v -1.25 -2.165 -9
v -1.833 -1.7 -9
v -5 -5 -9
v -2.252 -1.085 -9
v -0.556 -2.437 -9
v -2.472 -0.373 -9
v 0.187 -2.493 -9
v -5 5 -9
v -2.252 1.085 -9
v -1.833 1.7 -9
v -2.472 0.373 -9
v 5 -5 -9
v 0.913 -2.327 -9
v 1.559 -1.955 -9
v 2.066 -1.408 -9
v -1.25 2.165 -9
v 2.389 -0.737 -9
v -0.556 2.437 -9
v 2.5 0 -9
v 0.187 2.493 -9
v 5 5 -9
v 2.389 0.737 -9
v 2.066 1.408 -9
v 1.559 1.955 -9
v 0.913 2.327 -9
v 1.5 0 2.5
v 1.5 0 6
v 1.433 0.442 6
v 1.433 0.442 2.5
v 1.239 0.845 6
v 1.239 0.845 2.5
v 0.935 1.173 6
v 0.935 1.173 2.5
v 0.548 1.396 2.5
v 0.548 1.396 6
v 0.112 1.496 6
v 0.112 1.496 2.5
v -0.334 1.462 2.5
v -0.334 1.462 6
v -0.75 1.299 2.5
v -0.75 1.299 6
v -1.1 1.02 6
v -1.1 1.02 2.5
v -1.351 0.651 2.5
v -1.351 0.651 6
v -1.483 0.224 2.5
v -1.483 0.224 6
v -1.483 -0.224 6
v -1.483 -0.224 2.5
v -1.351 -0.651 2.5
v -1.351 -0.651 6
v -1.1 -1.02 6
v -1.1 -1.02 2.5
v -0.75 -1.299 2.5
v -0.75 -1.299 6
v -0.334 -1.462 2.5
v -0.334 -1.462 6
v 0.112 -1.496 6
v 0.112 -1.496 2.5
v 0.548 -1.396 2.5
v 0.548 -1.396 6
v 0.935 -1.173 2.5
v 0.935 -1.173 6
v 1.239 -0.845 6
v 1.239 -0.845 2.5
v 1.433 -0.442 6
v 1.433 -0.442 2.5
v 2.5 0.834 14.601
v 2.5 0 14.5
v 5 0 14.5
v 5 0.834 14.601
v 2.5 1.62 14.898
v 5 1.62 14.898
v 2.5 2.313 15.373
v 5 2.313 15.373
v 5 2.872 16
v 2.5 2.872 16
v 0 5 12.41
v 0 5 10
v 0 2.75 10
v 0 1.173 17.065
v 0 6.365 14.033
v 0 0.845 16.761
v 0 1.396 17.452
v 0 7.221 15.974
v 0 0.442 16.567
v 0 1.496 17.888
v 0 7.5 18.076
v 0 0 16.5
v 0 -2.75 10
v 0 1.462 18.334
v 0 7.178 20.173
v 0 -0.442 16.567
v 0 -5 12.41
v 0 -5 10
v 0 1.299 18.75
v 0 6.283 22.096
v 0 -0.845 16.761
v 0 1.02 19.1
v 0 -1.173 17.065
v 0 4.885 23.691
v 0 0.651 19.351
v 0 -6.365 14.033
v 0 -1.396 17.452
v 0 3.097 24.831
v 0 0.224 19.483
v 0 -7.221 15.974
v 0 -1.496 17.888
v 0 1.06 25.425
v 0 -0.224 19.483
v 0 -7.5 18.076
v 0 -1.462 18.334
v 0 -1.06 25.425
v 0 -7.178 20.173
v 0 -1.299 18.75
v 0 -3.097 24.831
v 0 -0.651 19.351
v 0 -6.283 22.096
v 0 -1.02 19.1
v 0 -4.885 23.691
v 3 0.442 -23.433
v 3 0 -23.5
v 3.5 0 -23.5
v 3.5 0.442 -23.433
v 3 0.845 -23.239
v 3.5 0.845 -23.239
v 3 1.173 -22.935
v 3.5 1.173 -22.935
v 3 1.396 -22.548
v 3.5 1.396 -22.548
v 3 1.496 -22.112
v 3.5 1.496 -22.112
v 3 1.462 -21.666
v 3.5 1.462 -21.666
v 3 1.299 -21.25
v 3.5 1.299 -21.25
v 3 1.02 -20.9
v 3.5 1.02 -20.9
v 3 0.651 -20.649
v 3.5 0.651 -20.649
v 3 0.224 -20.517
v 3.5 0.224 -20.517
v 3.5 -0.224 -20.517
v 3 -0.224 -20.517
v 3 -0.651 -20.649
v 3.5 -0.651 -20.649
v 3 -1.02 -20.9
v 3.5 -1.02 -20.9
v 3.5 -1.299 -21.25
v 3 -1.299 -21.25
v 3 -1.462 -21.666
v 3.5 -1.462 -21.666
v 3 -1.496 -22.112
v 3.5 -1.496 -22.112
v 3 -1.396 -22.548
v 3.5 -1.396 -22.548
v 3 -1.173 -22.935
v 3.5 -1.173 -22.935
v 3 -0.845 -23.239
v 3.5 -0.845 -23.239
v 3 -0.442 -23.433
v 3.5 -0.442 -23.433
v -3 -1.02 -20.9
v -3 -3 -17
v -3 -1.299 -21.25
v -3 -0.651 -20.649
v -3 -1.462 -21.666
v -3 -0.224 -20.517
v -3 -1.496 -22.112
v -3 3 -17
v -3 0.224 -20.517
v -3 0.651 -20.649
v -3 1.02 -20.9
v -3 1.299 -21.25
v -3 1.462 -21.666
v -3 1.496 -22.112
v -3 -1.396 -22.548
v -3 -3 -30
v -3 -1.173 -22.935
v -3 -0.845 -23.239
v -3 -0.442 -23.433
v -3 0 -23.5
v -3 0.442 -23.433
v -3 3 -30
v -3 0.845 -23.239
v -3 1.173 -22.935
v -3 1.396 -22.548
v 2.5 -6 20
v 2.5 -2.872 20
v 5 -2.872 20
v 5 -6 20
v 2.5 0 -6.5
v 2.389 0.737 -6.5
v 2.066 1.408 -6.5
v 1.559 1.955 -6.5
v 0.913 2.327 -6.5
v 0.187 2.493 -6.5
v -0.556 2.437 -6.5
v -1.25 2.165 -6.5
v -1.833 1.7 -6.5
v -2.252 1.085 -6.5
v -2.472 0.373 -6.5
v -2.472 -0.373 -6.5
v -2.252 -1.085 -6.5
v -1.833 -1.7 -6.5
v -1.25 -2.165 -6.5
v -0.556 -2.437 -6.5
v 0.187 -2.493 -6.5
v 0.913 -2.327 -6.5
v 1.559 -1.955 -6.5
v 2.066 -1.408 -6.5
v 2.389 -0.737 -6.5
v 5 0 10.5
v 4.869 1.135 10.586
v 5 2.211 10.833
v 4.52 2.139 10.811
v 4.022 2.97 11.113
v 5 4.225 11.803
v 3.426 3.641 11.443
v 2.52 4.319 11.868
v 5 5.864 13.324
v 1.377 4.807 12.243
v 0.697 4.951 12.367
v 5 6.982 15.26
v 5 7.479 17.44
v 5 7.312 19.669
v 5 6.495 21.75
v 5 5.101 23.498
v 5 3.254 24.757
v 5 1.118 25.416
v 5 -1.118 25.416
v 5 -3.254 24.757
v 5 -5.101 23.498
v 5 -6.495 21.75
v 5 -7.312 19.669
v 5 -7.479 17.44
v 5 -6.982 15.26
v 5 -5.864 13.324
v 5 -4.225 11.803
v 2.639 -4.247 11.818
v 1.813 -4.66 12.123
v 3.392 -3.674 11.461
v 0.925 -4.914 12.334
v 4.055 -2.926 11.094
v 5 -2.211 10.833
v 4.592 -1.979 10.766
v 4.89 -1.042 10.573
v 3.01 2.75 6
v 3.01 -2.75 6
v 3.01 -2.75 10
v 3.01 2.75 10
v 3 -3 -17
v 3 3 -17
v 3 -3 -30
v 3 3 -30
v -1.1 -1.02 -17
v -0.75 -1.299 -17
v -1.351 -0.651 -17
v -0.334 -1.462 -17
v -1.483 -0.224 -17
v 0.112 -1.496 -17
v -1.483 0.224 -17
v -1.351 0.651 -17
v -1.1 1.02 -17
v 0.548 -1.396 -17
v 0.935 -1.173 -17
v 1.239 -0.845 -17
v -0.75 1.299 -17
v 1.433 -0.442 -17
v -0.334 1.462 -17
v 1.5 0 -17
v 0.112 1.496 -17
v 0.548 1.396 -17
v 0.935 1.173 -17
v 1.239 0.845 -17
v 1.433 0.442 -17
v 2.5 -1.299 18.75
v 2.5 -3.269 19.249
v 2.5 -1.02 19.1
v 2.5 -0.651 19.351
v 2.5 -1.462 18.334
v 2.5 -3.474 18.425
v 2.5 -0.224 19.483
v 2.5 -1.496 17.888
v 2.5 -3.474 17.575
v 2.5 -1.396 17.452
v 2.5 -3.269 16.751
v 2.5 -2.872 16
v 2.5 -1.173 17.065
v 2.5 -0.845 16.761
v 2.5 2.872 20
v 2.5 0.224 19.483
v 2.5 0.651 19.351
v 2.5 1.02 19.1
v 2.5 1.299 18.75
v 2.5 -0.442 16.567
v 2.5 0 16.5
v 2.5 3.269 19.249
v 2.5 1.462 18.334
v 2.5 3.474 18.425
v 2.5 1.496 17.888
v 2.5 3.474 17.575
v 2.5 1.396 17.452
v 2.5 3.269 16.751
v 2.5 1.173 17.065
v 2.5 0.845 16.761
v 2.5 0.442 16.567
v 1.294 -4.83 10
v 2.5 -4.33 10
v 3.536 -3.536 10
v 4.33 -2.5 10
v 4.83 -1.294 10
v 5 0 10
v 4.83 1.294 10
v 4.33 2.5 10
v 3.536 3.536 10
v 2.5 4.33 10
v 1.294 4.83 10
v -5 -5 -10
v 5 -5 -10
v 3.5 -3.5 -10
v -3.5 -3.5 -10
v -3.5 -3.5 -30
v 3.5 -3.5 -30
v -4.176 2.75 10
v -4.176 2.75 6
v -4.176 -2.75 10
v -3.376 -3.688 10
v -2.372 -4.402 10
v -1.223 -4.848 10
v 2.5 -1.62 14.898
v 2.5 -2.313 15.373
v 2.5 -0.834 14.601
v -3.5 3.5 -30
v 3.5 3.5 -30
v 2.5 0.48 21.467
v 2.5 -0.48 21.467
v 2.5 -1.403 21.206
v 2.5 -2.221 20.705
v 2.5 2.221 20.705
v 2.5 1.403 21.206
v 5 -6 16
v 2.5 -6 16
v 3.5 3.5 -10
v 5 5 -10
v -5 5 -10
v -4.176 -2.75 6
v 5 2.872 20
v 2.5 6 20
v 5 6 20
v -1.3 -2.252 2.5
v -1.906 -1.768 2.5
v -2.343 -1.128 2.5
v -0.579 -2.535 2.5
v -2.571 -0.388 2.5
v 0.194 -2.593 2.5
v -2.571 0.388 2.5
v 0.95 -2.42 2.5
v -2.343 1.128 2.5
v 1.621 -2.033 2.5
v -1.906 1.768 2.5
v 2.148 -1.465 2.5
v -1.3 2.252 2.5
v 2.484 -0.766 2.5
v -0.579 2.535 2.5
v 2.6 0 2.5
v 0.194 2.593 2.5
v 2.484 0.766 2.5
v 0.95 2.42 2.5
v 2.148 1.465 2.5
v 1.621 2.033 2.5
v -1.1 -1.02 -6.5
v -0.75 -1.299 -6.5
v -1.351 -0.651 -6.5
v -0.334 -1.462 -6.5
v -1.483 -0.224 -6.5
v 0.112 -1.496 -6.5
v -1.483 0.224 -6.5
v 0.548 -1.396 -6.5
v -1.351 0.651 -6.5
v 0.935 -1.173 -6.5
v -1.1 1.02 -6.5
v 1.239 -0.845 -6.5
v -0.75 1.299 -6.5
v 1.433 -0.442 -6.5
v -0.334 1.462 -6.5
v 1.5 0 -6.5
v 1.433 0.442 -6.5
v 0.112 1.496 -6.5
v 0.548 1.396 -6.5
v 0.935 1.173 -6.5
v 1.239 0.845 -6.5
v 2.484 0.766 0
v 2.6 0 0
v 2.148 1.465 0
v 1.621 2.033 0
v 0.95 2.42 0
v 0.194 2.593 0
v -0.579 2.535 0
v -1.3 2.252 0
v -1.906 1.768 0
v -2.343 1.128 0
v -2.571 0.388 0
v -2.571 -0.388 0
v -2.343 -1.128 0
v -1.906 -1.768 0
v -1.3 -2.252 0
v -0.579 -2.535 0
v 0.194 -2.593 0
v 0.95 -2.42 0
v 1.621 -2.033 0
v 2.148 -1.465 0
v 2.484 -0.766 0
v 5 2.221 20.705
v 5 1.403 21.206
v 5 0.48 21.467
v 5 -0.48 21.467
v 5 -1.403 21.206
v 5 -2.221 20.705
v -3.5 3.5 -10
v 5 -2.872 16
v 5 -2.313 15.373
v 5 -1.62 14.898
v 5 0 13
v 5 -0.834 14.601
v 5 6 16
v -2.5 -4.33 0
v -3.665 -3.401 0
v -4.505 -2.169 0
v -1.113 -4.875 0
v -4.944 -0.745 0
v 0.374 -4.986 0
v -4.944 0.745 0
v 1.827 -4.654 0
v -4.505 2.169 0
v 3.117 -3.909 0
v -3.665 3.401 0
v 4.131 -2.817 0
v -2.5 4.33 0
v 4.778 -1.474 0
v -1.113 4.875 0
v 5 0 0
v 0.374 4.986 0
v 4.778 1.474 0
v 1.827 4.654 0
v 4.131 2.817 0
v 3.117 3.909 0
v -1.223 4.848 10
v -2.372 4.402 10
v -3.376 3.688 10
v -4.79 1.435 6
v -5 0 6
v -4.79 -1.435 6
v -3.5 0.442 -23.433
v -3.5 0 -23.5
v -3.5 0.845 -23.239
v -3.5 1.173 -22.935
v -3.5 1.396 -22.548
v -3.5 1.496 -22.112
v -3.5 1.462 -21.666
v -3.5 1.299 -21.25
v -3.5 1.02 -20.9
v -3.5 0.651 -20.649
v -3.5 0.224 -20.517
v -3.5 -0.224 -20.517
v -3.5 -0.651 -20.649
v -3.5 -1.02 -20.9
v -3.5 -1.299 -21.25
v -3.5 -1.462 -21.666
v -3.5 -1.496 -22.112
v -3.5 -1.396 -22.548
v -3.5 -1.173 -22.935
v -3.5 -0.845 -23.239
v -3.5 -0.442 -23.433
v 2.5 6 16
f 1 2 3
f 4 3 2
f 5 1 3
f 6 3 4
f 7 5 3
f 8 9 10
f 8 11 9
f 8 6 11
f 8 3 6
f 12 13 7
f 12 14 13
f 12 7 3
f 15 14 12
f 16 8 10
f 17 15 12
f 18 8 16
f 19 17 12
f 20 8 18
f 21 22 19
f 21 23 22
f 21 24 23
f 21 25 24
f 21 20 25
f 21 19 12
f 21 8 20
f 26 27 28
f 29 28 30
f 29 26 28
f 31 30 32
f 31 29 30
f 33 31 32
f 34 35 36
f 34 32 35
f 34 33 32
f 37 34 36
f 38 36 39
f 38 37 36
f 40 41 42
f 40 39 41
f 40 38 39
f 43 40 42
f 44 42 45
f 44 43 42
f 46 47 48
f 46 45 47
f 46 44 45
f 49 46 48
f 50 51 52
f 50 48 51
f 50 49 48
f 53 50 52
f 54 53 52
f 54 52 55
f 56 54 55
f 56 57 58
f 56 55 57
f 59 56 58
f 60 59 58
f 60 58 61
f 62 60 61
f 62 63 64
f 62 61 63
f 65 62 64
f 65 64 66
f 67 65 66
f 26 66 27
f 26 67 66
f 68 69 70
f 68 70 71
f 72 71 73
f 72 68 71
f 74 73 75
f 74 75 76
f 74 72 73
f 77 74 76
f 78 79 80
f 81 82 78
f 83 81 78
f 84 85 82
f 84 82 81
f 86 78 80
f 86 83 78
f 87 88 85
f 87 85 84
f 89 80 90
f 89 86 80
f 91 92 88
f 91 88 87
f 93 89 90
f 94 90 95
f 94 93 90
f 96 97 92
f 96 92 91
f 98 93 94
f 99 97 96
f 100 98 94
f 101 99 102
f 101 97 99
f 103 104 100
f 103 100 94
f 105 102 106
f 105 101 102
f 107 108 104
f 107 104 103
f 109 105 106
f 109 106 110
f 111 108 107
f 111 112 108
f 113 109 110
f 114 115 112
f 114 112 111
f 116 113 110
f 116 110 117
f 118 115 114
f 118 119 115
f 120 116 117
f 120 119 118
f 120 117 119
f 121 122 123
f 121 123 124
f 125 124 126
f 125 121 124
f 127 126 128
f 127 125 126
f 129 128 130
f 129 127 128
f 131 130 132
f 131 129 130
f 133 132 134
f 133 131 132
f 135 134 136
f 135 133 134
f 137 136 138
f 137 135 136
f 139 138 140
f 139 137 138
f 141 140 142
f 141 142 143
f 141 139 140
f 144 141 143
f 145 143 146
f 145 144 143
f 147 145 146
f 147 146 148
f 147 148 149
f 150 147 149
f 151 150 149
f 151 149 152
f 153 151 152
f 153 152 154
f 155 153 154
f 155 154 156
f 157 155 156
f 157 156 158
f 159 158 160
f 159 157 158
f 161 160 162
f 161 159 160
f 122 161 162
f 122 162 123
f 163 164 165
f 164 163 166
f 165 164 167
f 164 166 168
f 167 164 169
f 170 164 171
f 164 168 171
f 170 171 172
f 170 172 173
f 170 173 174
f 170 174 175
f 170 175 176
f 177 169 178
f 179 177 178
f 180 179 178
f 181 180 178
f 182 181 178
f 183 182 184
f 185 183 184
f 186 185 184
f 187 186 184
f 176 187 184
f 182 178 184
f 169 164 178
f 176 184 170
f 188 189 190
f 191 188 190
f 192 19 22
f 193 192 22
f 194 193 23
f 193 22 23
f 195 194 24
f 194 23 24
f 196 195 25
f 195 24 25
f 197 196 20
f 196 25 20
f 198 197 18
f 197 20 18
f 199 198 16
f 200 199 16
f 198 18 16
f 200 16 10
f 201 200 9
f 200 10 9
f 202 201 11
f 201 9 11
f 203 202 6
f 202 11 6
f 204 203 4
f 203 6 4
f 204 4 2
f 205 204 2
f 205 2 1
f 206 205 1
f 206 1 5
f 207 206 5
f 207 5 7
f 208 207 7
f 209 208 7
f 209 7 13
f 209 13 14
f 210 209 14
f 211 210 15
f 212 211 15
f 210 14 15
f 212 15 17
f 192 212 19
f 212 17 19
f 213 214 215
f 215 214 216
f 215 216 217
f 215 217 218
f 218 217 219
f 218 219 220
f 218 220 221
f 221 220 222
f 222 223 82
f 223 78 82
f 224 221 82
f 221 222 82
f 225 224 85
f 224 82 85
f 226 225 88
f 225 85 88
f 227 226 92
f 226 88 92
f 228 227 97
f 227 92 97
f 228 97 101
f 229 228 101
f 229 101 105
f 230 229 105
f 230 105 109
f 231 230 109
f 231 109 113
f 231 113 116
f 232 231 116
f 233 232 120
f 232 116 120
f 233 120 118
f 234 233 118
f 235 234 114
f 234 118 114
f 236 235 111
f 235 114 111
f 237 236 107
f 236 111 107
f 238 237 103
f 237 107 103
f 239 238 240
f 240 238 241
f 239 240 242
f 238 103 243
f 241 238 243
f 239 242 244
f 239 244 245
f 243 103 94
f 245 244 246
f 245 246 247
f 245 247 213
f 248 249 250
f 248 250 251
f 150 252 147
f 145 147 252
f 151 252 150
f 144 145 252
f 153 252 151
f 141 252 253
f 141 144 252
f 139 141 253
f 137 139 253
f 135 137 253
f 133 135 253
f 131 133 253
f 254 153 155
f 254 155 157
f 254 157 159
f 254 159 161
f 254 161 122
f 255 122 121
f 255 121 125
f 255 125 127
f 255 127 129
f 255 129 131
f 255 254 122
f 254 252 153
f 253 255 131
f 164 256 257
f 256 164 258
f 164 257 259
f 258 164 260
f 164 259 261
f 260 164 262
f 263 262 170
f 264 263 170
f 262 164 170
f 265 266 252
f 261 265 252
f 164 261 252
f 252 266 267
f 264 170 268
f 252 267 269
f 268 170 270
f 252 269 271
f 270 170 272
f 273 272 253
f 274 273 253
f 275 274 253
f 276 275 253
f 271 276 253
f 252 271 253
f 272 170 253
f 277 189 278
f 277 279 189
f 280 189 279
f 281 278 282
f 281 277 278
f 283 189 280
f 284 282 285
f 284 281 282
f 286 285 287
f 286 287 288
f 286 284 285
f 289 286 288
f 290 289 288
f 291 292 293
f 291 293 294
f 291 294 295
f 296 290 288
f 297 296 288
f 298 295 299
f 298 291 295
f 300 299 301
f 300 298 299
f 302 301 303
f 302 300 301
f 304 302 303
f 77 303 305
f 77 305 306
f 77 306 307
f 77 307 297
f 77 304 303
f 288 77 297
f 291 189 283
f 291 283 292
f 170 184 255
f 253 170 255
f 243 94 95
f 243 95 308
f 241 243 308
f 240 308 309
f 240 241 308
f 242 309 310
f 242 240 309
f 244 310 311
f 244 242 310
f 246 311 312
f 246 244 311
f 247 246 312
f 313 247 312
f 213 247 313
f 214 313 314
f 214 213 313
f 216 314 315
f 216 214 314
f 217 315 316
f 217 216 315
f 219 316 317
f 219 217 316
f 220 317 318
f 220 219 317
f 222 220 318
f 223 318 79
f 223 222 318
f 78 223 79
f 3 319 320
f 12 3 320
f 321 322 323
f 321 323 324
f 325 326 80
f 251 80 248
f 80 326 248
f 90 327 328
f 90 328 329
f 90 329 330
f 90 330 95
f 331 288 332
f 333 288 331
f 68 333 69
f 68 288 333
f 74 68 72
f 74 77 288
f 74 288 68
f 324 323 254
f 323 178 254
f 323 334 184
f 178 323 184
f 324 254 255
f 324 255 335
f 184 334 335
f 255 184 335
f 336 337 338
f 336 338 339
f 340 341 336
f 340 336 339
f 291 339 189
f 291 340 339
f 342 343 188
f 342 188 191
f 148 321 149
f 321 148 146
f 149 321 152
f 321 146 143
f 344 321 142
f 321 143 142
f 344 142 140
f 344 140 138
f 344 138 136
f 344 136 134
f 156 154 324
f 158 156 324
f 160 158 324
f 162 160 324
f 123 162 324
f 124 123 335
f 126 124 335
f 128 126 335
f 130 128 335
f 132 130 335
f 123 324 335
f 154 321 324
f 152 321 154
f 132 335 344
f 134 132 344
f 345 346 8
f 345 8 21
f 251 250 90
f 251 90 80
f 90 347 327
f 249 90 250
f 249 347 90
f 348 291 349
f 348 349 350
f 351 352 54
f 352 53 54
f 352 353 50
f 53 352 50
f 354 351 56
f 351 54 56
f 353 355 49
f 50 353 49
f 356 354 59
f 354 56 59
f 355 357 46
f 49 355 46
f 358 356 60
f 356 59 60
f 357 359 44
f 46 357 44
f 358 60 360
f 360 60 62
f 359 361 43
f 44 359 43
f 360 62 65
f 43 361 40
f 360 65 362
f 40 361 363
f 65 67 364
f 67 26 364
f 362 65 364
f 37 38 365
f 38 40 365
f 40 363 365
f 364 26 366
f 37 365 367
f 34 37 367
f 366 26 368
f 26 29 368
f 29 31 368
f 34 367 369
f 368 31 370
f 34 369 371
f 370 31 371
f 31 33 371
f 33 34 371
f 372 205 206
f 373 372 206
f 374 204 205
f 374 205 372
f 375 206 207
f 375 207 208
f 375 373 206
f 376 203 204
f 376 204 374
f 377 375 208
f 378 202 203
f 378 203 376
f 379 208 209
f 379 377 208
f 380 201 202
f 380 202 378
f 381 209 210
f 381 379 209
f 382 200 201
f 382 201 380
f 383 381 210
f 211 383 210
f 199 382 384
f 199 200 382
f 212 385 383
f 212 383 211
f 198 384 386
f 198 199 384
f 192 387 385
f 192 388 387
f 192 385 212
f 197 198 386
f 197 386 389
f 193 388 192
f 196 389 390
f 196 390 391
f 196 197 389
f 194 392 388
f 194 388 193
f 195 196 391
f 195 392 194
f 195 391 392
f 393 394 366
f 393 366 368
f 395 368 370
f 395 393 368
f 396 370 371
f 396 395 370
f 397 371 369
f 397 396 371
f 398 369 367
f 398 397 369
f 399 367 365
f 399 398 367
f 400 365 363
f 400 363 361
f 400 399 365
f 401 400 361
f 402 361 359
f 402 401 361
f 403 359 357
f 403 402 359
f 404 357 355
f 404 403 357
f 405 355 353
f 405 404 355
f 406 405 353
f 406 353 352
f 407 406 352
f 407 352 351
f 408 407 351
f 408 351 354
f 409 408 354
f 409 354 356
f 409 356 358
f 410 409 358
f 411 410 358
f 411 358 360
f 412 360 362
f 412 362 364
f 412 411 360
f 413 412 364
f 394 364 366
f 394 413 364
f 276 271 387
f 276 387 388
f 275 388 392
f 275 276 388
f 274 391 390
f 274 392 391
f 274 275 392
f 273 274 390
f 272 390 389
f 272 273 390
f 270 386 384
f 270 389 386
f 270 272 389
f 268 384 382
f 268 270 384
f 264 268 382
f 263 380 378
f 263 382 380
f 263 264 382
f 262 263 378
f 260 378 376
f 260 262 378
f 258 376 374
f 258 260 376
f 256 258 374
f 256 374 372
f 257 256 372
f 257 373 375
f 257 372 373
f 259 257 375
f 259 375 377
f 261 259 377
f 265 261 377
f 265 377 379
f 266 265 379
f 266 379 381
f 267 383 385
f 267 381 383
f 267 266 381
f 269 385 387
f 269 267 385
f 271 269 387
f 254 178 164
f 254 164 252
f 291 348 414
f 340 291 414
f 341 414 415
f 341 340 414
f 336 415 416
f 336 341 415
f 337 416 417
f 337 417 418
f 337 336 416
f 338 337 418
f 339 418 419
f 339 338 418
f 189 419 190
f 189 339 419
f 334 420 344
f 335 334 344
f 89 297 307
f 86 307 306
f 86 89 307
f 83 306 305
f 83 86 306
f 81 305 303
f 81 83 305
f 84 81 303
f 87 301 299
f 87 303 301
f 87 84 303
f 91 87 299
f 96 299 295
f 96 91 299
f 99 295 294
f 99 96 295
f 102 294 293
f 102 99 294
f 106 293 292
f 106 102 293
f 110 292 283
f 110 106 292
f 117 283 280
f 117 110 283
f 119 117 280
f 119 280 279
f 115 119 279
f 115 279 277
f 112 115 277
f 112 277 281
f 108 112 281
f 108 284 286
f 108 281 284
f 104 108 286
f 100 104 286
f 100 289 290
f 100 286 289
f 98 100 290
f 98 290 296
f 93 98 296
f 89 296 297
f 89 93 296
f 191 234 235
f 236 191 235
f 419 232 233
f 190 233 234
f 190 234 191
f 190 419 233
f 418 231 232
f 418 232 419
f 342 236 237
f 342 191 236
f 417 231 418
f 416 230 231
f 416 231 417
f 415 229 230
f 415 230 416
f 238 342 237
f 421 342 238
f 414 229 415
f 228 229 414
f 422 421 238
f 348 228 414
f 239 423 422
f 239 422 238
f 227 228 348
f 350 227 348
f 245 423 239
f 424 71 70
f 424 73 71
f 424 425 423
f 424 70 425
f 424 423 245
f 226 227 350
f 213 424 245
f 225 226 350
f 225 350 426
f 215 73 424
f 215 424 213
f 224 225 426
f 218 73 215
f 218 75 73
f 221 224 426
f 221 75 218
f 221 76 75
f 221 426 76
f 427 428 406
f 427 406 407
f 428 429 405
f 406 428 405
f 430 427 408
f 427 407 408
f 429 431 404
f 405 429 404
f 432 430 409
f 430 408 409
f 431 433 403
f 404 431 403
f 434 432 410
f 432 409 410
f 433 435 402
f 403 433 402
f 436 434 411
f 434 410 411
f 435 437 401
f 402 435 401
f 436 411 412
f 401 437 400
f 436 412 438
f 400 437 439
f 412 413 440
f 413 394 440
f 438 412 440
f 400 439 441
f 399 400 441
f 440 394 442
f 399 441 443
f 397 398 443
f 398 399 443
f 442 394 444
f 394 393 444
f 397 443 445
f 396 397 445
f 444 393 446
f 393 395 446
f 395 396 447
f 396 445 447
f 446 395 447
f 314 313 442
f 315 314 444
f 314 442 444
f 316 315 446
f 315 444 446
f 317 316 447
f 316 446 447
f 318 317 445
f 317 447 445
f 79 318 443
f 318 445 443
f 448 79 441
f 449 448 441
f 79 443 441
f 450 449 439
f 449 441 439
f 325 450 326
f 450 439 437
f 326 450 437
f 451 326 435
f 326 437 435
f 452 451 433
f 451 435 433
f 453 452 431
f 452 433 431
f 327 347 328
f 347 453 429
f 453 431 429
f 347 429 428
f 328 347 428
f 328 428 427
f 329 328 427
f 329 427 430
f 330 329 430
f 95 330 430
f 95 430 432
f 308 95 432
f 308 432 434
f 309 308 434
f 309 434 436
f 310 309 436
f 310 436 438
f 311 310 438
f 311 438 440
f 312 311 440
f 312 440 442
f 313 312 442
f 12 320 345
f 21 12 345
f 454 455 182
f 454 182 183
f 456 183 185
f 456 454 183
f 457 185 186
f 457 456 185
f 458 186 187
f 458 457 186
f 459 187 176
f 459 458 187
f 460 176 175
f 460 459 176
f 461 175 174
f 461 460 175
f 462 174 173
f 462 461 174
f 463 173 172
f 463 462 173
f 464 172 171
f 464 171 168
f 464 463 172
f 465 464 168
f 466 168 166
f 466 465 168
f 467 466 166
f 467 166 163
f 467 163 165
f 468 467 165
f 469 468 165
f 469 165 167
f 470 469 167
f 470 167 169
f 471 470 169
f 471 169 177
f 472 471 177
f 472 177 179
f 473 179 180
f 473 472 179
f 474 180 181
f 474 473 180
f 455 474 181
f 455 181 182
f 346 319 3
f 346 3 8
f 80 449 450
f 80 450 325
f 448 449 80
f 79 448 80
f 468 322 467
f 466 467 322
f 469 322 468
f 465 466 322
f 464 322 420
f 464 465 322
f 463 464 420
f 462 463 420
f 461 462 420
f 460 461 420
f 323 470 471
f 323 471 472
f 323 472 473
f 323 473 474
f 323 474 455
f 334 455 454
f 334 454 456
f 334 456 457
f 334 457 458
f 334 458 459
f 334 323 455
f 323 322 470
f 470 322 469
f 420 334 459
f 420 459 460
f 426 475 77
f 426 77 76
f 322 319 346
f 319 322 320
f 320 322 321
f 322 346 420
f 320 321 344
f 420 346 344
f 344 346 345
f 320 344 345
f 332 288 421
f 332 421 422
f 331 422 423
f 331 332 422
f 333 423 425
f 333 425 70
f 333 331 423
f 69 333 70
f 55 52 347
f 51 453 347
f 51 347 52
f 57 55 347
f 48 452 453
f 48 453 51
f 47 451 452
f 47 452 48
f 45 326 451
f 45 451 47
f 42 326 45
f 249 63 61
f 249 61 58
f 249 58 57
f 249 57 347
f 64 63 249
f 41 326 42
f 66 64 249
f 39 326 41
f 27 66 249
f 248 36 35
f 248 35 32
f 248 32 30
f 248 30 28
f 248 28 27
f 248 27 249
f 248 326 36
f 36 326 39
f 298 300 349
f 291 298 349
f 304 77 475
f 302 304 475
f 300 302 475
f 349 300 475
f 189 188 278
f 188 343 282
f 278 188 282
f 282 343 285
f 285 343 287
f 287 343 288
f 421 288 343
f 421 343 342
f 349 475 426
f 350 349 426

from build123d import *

# Parameters (mm, degrees)
CYLINDER003_R               = 1.5
CYLINDER003_DEPTH           = 0.5
CYLINDER003_PITCH_ANGLE     = 90
CYLINDER002_R               = 1.5
CYLINDER002_DEPTH           = 0.5
CYLINDER002_PITCH_ANGLE     = 90
CYLINDER001_R               = 1.5
CYLINDER001_DEPTH           = 12
BOX003_W                    = 6
BOX003_H                    = 6
BOX003_DEPTH                = 13
CYLINDER_R                  = 2.5
CYLINDER_DEPTH              = 2.5
BOX001_W                    = 7
BOX001_H                    = 7
BOX001_DEPTH                = 20
BOX_W                       = 10
BOX_H                       = 10
BOX_DEPTH                   = 1
BOX007_W                    = 2.5
BOX007_H                    = 12
BOX007_DEPTH                = 4
BOX006_W                    = 1.99
BOX006_H                    = 10
BOX006_DEPTH                = 4
BOX004_W                    = 10
BOX004_H                    = 2.25
BOX004_DEPTH                = 4
BOX005_W                    = 10
BOX005_H                    = 2.25
BOX005_DEPTH                = 4
CYLINDER013_R               = 5
CYLINDER013_DEPTH           = 4
CYLINDER007_R               = 1.5
CYLINDER007_DEPTH           = 5
CYLINDER005_R               = 2.6
CYLINDER005_DEPTH           = 2.5
CYLINDER004_R               = 5
CYLINDER004_DEPTH           = 10
CYLINDER009_W               = 5
CYLINDER009_H               = 3
CYLINDER009_ANGLE           = 180
CYLINDER009_PLACEMENT_ANGLE = -90
CYLINDER012_R               = 3.5
CYLINDER012_DEPTH           = 2.5
CYLINDER012_PITCH_ANGLE     = 90
CYLINDER011_R               = 1.5
CYLINDER011_DEPTH           = 5
CYLINDER011_PITCH_ANGLE     = 90
CYLINDER008_R               = 7.5
CYLINDER008_DEPTH           = 5
CYLINDER008_PITCH_ANGLE     = 90


with BuildPart() as zylinder003:
    # Cylinder003 → Cylinder003 (new body)
    with BuildSketch(Plane.XY):
        Circle(CYLINDER003_R)
    extrude(amount=CYLINDER003_DEPTH)


with BuildPart() as zylinder003_1:
    # Cylinder003 pitch: moved
    add(zylinder003.part.rotate(Axis((0, 0, 0), (0, 1, 0)), CYLINDER003_PITCH_ANGLE))


with BuildPart() as zylinder003_2:
    # Cylinder003 placement: moved
    add(zylinder003_1.part.moved(Location((-3.5, 0, -22))))


with BuildPart() as zylinder002:
    # Cylinder002 → Cylinder002 (new body)
    with BuildSketch(Plane.XY):
        Circle(CYLINDER002_R)
    extrude(amount=CYLINDER002_DEPTH)


with BuildPart() as zylinder002_1:
    # Cylinder002 pitch: moved
    add(zylinder002.part.rotate(Axis((0, 0, 0), (0, 1, 0)), CYLINDER002_PITCH_ANGLE))


with BuildPart() as zylinder002_2:
    # Cylinder002 placement: moved
    add(zylinder002_1.part.moved(Location((3, 0, -22))))


with BuildPart() as zylinder001:
    # Cylinder001 → Cylinder001 (new body)
    with BuildSketch(Plane.XY.offset(-18)):
        Circle(CYLINDER001_R)
    extrude(amount=CYLINDER001_DEPTH)


with BuildPart() as w_rfel003:
    # Box003 → Box003 (new body)
    with BuildSketch(Plane(origin=(-3, -3, -30), x_dir=(1, 0, 0), z_dir=(0, 0, 1))):
        with Locations((3, 3)):
            Rectangle(BOX003_W, BOX003_H)
    extrude(amount=BOX003_DEPTH)


with BuildPart() as zylinder:
    # Cylinder → Cylinder (new body)
    with BuildSketch(Plane.XY.offset(-9)):
        Circle(CYLINDER_R)
    extrude(amount=CYLINDER_DEPTH)


with BuildPart() as w_rfel001:
    # Box001 → Box001 (new body)
    with BuildSketch(Plane(origin=(-3.5, -3.5, -30), x_dir=(1, 0, 0), z_dir=(0, 0, 1))):
        with Locations((3.5, 3.5)):
            Rectangle(BOX001_W, BOX001_H)
    extrude(amount=BOX001_DEPTH)


with BuildPart() as bottom:
    # Box → Box (new body)
    with BuildSketch(Plane(origin=(-5, -5, -10), x_dir=(1, 0, 0), z_dir=(0, 0, 1))):
        with Locations((5, 5)):
            Rectangle(BOX_W, BOX_H)
    extrude(amount=BOX_DEPTH)

    # Fusion001: union Zylinder, Würfel001
    add(zylinder.part)
    add(w_rfel001.part)

    # Cut: cut Würfel003
    add(w_rfel003.part, mode=Mode.SUBTRACT)

    # Cut001: cut Zylinder001
    add(zylinder001.part, mode=Mode.SUBTRACT)

    # Cut002: cut Zylinder002
    add(zylinder002_2.part, mode=Mode.SUBTRACT)

    # Cut003: cut Zylinder003
    add(zylinder003_2.part, mode=Mode.SUBTRACT)


with BuildPart() as w_rfel007:
    # Box007 → Box007 (new body)
    with BuildSketch(Plane(origin=(2.5, -6, 16), x_dir=(1, 0, 0), z_dir=(0, 0, 1))):
        with Locations((1.25, 6)):
            Rectangle(BOX007_W, BOX007_H)
    extrude(amount=BOX007_DEPTH)


with BuildPart() as w_rfel006:
    # Box006 → Box006 (new body)
    with BuildSketch(Plane(origin=(3.01, 12, 0), x_dir=(1, 0, 0), z_dir=(0, 0, 1))):
        with Locations((0.995, 5)):
            Rectangle(BOX006_W, BOX006_H)
    extrude(amount=BOX006_DEPTH)


with BuildPart() as w_rfel004:
    # Box004 → Box004 (new body)
    with BuildSketch(Plane(origin=(-5, 19.75, 0), x_dir=(1, 0, 0), z_dir=(0, 0, 1))):
        with Locations((5, 1.125)):
            Rectangle(BOX004_W, BOX004_H)
    extrude(amount=BOX004_DEPTH)


with BuildPart() as fusion002:
    # Box005 → Box005 (new body)
    with BuildSketch(Plane(origin=(-5, 12, 0), x_dir=(1, 0, 0), z_dir=(0, 0, 1))):
        with Locations((5, 1.125)):
            Rectangle(BOX005_W, BOX005_H)
    extrude(amount=BOX005_DEPTH)

    # Fusion: union Würfel004
    add(w_rfel004.part)

    # Fusion002: union Würfel006
    add(w_rfel006.part)


with BuildPart() as cut011:
    # Cylinder013 → Cylinder013 (new body)
    with BuildSketch(Plane(origin=(0, 17, 0), x_dir=(1, 0, 0), z_dir=(0, 0, 1))):
        Circle(CYLINDER013_R)
    extrude(amount=CYLINDER013_DEPTH)

    # Cut011: cut Fusion002
    add(fusion002.part, mode=Mode.SUBTRACT)


with BuildPart() as cut011_1:
    # Cut011 placement: moved
    add(cut011.part.moved(Location((0, -17, 6))))


with BuildPart() as zylinder007:
    # Cylinder007 → Cylinder007 (new body)
    with BuildSketch(Plane.XY.offset(2.5)):
        Circle(CYLINDER007_R)
    extrude(amount=CYLINDER007_DEPTH)


with BuildPart() as zylinder005:
    # Cylinder005 → Cylinder005 (new body)
    with BuildSketch(Plane.XY):
        Circle(CYLINDER005_R)
    extrude(amount=CYLINDER005_DEPTH)


with BuildPart() as cut012:
    # Cylinder004 → Cylinder004 (new body)
    with BuildSketch(Plane.XY):
        Circle(CYLINDER004_R)
    extrude(amount=CYLINDER004_DEPTH)

    # Cut004: cut Zylinder005
    add(zylinder005.part, mode=Mode.SUBTRACT)

    # Cut009: cut Zylinder007
    add(zylinder007.part, mode=Mode.SUBTRACT)

    # Cut012: cut Cut011
    add(cut011_1.part, mode=Mode.SUBTRACT)


with BuildPart() as zylinder009:
    # Cylinder009 → Cylinder009 (revolve)
    with BuildSketch(Plane.XZ):
        with Locations((2.5, 1.5)):
            Rectangle(CYLINDER009_W, CYLINDER009_H)
    revolve(axis=Axis((0, 0, 0), (0, 0, 1)), revolution_arc=CYLINDER009_ANGLE)


with BuildPart() as zylinder009_1:
    # Cylinder009 placement: moved
    add(zylinder009.part.moved(Location((0, 0, 10))).rotate(Axis((0, 0, 10), (0, 0, 1)), CYLINDER009_PLACEMENT_ANGLE))


with BuildPart() as zylinder012:
    # Cylinder012 → Cylinder012 (new body)
    with BuildSketch(Plane.XY):
        Circle(CYLINDER012_R)
    extrude(amount=CYLINDER012_DEPTH)


with BuildPart() as zylinder012_1:
    # Cylinder012 pitch: moved
    add(zylinder012.part.rotate(Axis((0, 0, 0), (0, 1, 0)), CYLINDER012_PITCH_ANGLE))


with BuildPart() as zylinder012_2:
    # Cylinder012 placement: moved
    add(zylinder012_1.part.moved(Location((2.5, 0, 18))))


with BuildPart() as zylinder011:
    # Cylinder011 → Cylinder011 (new body)
    with BuildSketch(Plane.XY):
        Circle(CYLINDER011_R)
    extrude(amount=CYLINDER011_DEPTH)


with BuildPart() as zylinder011_1:
    # Cylinder011 pitch: moved
    add(zylinder011.part.rotate(Axis((0, 0, 0), (0, 1, 0)), CYLINDER011_PITCH_ANGLE))


with BuildPart() as zylinder011_2:
    # Cylinder011 placement: moved
    add(zylinder011_1.part.moved(Location((0, 0, 18))))


with BuildPart() as top:
    # Cylinder008 → Cylinder008 (new body)
    with BuildSketch(Plane.XY):
        Circle(CYLINDER008_R)
    extrude(amount=CYLINDER008_DEPTH)


with BuildPart() as top_1:
    # Cylinder008 pitch: moved
    add(top.part.rotate(Axis((0, 0, 0), (0, 1, 0)), CYLINDER008_PITCH_ANGLE))


with BuildPart() as top_2:
    # Cylinder008 placement: moved
    add(top_1.part.moved(Location((0, 0, 18))))

    # Cut008: cut Zylinder011
    add(zylinder011_2.part, mode=Mode.SUBTRACT)

    # Cut010: cut Zylinder012
    add(zylinder012_2.part, mode=Mode.SUBTRACT)

    # Fusion003: union Zylinder009
    add(zylinder009_1.part)

    # Fusion004: union Cut012
    add(cut012.part)

    # Cut013: cut Würfel007
    add(w_rfel007.part, mode=Mode.SUBTRACT)


solid = Compound([bottom.part, top_2.part])
